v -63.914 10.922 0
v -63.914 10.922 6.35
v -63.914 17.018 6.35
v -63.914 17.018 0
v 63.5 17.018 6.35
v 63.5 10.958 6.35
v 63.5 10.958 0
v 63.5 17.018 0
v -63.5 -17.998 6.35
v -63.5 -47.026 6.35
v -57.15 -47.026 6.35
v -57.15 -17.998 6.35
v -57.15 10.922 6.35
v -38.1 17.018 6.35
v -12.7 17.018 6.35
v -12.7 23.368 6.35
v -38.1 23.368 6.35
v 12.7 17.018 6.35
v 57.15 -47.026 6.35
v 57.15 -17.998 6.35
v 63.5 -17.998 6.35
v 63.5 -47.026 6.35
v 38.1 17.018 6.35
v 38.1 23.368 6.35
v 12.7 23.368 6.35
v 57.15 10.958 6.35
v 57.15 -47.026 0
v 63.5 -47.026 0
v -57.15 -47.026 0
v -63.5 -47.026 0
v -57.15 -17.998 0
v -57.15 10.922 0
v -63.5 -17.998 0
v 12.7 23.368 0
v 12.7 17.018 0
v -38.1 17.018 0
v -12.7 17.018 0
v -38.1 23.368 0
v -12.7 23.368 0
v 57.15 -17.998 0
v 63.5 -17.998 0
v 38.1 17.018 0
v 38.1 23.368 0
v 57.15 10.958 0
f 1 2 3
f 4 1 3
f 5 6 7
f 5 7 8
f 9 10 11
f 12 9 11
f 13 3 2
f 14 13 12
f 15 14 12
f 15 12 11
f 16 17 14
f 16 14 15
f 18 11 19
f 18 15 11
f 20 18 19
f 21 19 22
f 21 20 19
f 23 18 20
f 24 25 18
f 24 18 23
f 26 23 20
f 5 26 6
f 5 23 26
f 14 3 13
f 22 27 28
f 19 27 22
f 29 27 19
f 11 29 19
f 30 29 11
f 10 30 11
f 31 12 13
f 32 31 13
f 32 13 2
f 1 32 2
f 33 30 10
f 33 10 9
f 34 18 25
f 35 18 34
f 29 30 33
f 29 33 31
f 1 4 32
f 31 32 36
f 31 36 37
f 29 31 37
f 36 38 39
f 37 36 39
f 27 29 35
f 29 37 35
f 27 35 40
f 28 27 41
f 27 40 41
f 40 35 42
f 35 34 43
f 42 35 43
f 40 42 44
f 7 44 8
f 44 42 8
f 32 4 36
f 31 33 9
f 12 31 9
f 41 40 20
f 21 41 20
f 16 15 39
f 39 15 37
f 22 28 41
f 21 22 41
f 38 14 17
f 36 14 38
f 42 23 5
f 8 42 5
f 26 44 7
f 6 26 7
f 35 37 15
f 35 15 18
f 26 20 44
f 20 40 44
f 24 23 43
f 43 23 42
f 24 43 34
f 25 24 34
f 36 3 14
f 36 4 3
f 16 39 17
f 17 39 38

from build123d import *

# Parameters (mm, degrees)
SKETCH2_W             = 127
SKETCH2_H             = 152.4
BOSS_EXTRUDE2_DEPTH   = 6.35
SKETCH3_W             = 127
SKETCH3_H             = 65.278
CUT_EXTRUDE1_DEPTH    = 100.3932216
CAVITY1_START         = -63.5
CAVITY1_OUTLINE_W     = 28.919714286
CAVITY1_OUTLINE_H     = 6.35
CAVITY1_OUTLINE_W_2   = 29.028571429
CAVITY1_DEPTH         = 6.35
CAVITY1_START_2       = 57.15
CAVITY1_2_OUTLINE_W   = 28.919714286
CAVITY1_2_OUTLINE_H   = 6.35
CAVITY1_2_OUTLINE_W_2 = 29.028571429
CAVITY1_2_DEPTH       = 6.35
CUT_EXTRUDE2_DEPTH    = 100.3932216
BOSS_EXTRUDE3_DEPTH   = 6.35
CAVITY2_START         = 17.018
CAVITY2_OUTLINE_W     = 20.9
CAVITY2_OUTLINE_H     = 9
CAVITY2_OUTLINE_W_2   = 25.4
CAVITY2_OUTLINE_W_3   = 19.05
CAVITY2_DEPTH         = 6.35
SKETCH6_W             = 6.35
SKETCH6_H             = 6.059714286
BOSS_EXTRUDE4_DEPTH   = 6.35
SKETCH7_W             = 114.3
SKETCH7_H             = 29.173714286
CUT_EXTRUDE3_DEPTH    = 100.658360693


# Read off the part's stored shape, not the designer's step: Cavity1, Cavity2
with BuildPart() as part:
    # Sketch2 → Boss-Extrude2 (new body)
    with BuildSketch(Plane.XY):
        Rectangle(SKETCH2_W, SKETCH2_H)
    extrude(amount=BOSS_EXTRUDE2_DEPTH)

    # Sketch3 → Cut-Extrude1 (cut, through all)
    with BuildSketch(Plane.XY.offset(6.35)):
        with Locations((0, 43.561)):
            Rectangle(SKETCH3_W, SKETCH3_H)
    extrude(amount=-CUT_EXTRUDE1_DEPTH, mode=Mode.SUBTRACT)

    # Cavity1 outline → Cavity1 (cut)
    with BuildSketch(Plane.YZ.offset(CAVITY1_START)):
        with Locations((-3.537857143, 3.175)):
            Rectangle(CAVITY1_OUTLINE_W, CAVITY1_OUTLINE_H)
        with Locations((-61.540571429, 3.175)):
            Rectangle(CAVITY1_OUTLINE_W_2, CAVITY1_OUTLINE_H)
    extrude(amount=CAVITY1_DEPTH, mode=Mode.SUBTRACT)

    # Cavity1 2 outline → Cavity1 2 (cut)
    with BuildSketch(Plane.YZ.offset(CAVITY1_START_2)):
        with Locations((-3.537857143, 3.175)):
            Rectangle(CAVITY1_2_OUTLINE_W, CAVITY1_2_OUTLINE_H)
        with Locations((-61.540571429, 3.175)):
            Rectangle(CAVITY1_2_OUTLINE_W_2, CAVITY1_2_OUTLINE_H)
    extrude(amount=CAVITY1_2_DEPTH, mode=Mode.SUBTRACT)

    # Sketch4 → Cut-Extrude2 (cut, through all)
    with BuildSketch(Plane(origin=(0, 0, 0), x_dir=(-1, 0, 0), z_dir=(0, 0, -1))):
        Polygon((-57.15, -76.054857143), (-57.15, -79.645008966), (-65.377811093, -79.645008966), (-65.377811093, -73.782579567), (-57.15, -73.782579567), align=None)
        Polygon((57.15, -76.054857143), (57.15, -79.645008966), (65.72742819, -79.645008966), (65.72742819, -72.849920344), (57.15, -72.849920344), align=None)
    extrude(amount=-CUT_EXTRUDE2_DEPTH, mode=Mode.SUBTRACT)

    # Sketch5 → Boss-Extrude3 (add, through all)
    with BuildSketch(Plane(origin=(0, 0, 0), x_dir=(-1, 0, 0), z_dir=(0, 0, -1))):
        Polygon((-57.15, 10.922), (-57.15, 23.368), (57.995680603, 23.368), (57.15, 10.922), align=None)
    extrude(amount=-BOSS_EXTRUDE3_DEPTH)

    # Cavity2 outline → Cavity2 (cut)
    with BuildSketch(Plane(origin=(0, 0, 0), x_dir=(1, 0, 0), z_dir=(0, 1, 0)).offset(CAVITY2_START)):
        with Locations((-48.55, -3.5)):
            Rectangle(CAVITY2_OUTLINE_W, CAVITY2_OUTLINE_H)
        with Locations((0, -3.5)):
            Rectangle(CAVITY2_OUTLINE_W_2, CAVITY2_OUTLINE_H)
        with Locations((47.625, -3.5)):
            Rectangle(CAVITY2_OUTLINE_W_3, CAVITY2_OUTLINE_H)
    extrude(amount=CAVITY2_DEPTH, mode=Mode.SUBTRACT)

    # Sketch6 → Boss-Extrude4 (add, through all)
    with BuildSketch(Plane.XY.offset(6.35)):
        with Locations((60.325, 13.988142857)):
            Rectangle(SKETCH6_W, SKETCH6_H)
        Polygon((-63.914210908, 17.018), (-57.564210908, 17.018), (-57.15, 10.922), (-63.914210908, 10.922), align=None)
    extrude(amount=-BOSS_EXTRUDE4_DEPTH)

    # Sketch7 → Cut-Extrude3 (cut, through all)
    with BuildSketch(Plane(origin=(0, 0, 0), x_dir=(-1, 0, 0), z_dir=(0, 0, -1))):
        with Locations((0, -61.613142857)):
            Rectangle(SKETCH7_W, SKETCH7_H)
    extrude(amount=-CUT_EXTRUDE3_DEPTH, mode=Mode.SUBTRACT)


solid = part.part
